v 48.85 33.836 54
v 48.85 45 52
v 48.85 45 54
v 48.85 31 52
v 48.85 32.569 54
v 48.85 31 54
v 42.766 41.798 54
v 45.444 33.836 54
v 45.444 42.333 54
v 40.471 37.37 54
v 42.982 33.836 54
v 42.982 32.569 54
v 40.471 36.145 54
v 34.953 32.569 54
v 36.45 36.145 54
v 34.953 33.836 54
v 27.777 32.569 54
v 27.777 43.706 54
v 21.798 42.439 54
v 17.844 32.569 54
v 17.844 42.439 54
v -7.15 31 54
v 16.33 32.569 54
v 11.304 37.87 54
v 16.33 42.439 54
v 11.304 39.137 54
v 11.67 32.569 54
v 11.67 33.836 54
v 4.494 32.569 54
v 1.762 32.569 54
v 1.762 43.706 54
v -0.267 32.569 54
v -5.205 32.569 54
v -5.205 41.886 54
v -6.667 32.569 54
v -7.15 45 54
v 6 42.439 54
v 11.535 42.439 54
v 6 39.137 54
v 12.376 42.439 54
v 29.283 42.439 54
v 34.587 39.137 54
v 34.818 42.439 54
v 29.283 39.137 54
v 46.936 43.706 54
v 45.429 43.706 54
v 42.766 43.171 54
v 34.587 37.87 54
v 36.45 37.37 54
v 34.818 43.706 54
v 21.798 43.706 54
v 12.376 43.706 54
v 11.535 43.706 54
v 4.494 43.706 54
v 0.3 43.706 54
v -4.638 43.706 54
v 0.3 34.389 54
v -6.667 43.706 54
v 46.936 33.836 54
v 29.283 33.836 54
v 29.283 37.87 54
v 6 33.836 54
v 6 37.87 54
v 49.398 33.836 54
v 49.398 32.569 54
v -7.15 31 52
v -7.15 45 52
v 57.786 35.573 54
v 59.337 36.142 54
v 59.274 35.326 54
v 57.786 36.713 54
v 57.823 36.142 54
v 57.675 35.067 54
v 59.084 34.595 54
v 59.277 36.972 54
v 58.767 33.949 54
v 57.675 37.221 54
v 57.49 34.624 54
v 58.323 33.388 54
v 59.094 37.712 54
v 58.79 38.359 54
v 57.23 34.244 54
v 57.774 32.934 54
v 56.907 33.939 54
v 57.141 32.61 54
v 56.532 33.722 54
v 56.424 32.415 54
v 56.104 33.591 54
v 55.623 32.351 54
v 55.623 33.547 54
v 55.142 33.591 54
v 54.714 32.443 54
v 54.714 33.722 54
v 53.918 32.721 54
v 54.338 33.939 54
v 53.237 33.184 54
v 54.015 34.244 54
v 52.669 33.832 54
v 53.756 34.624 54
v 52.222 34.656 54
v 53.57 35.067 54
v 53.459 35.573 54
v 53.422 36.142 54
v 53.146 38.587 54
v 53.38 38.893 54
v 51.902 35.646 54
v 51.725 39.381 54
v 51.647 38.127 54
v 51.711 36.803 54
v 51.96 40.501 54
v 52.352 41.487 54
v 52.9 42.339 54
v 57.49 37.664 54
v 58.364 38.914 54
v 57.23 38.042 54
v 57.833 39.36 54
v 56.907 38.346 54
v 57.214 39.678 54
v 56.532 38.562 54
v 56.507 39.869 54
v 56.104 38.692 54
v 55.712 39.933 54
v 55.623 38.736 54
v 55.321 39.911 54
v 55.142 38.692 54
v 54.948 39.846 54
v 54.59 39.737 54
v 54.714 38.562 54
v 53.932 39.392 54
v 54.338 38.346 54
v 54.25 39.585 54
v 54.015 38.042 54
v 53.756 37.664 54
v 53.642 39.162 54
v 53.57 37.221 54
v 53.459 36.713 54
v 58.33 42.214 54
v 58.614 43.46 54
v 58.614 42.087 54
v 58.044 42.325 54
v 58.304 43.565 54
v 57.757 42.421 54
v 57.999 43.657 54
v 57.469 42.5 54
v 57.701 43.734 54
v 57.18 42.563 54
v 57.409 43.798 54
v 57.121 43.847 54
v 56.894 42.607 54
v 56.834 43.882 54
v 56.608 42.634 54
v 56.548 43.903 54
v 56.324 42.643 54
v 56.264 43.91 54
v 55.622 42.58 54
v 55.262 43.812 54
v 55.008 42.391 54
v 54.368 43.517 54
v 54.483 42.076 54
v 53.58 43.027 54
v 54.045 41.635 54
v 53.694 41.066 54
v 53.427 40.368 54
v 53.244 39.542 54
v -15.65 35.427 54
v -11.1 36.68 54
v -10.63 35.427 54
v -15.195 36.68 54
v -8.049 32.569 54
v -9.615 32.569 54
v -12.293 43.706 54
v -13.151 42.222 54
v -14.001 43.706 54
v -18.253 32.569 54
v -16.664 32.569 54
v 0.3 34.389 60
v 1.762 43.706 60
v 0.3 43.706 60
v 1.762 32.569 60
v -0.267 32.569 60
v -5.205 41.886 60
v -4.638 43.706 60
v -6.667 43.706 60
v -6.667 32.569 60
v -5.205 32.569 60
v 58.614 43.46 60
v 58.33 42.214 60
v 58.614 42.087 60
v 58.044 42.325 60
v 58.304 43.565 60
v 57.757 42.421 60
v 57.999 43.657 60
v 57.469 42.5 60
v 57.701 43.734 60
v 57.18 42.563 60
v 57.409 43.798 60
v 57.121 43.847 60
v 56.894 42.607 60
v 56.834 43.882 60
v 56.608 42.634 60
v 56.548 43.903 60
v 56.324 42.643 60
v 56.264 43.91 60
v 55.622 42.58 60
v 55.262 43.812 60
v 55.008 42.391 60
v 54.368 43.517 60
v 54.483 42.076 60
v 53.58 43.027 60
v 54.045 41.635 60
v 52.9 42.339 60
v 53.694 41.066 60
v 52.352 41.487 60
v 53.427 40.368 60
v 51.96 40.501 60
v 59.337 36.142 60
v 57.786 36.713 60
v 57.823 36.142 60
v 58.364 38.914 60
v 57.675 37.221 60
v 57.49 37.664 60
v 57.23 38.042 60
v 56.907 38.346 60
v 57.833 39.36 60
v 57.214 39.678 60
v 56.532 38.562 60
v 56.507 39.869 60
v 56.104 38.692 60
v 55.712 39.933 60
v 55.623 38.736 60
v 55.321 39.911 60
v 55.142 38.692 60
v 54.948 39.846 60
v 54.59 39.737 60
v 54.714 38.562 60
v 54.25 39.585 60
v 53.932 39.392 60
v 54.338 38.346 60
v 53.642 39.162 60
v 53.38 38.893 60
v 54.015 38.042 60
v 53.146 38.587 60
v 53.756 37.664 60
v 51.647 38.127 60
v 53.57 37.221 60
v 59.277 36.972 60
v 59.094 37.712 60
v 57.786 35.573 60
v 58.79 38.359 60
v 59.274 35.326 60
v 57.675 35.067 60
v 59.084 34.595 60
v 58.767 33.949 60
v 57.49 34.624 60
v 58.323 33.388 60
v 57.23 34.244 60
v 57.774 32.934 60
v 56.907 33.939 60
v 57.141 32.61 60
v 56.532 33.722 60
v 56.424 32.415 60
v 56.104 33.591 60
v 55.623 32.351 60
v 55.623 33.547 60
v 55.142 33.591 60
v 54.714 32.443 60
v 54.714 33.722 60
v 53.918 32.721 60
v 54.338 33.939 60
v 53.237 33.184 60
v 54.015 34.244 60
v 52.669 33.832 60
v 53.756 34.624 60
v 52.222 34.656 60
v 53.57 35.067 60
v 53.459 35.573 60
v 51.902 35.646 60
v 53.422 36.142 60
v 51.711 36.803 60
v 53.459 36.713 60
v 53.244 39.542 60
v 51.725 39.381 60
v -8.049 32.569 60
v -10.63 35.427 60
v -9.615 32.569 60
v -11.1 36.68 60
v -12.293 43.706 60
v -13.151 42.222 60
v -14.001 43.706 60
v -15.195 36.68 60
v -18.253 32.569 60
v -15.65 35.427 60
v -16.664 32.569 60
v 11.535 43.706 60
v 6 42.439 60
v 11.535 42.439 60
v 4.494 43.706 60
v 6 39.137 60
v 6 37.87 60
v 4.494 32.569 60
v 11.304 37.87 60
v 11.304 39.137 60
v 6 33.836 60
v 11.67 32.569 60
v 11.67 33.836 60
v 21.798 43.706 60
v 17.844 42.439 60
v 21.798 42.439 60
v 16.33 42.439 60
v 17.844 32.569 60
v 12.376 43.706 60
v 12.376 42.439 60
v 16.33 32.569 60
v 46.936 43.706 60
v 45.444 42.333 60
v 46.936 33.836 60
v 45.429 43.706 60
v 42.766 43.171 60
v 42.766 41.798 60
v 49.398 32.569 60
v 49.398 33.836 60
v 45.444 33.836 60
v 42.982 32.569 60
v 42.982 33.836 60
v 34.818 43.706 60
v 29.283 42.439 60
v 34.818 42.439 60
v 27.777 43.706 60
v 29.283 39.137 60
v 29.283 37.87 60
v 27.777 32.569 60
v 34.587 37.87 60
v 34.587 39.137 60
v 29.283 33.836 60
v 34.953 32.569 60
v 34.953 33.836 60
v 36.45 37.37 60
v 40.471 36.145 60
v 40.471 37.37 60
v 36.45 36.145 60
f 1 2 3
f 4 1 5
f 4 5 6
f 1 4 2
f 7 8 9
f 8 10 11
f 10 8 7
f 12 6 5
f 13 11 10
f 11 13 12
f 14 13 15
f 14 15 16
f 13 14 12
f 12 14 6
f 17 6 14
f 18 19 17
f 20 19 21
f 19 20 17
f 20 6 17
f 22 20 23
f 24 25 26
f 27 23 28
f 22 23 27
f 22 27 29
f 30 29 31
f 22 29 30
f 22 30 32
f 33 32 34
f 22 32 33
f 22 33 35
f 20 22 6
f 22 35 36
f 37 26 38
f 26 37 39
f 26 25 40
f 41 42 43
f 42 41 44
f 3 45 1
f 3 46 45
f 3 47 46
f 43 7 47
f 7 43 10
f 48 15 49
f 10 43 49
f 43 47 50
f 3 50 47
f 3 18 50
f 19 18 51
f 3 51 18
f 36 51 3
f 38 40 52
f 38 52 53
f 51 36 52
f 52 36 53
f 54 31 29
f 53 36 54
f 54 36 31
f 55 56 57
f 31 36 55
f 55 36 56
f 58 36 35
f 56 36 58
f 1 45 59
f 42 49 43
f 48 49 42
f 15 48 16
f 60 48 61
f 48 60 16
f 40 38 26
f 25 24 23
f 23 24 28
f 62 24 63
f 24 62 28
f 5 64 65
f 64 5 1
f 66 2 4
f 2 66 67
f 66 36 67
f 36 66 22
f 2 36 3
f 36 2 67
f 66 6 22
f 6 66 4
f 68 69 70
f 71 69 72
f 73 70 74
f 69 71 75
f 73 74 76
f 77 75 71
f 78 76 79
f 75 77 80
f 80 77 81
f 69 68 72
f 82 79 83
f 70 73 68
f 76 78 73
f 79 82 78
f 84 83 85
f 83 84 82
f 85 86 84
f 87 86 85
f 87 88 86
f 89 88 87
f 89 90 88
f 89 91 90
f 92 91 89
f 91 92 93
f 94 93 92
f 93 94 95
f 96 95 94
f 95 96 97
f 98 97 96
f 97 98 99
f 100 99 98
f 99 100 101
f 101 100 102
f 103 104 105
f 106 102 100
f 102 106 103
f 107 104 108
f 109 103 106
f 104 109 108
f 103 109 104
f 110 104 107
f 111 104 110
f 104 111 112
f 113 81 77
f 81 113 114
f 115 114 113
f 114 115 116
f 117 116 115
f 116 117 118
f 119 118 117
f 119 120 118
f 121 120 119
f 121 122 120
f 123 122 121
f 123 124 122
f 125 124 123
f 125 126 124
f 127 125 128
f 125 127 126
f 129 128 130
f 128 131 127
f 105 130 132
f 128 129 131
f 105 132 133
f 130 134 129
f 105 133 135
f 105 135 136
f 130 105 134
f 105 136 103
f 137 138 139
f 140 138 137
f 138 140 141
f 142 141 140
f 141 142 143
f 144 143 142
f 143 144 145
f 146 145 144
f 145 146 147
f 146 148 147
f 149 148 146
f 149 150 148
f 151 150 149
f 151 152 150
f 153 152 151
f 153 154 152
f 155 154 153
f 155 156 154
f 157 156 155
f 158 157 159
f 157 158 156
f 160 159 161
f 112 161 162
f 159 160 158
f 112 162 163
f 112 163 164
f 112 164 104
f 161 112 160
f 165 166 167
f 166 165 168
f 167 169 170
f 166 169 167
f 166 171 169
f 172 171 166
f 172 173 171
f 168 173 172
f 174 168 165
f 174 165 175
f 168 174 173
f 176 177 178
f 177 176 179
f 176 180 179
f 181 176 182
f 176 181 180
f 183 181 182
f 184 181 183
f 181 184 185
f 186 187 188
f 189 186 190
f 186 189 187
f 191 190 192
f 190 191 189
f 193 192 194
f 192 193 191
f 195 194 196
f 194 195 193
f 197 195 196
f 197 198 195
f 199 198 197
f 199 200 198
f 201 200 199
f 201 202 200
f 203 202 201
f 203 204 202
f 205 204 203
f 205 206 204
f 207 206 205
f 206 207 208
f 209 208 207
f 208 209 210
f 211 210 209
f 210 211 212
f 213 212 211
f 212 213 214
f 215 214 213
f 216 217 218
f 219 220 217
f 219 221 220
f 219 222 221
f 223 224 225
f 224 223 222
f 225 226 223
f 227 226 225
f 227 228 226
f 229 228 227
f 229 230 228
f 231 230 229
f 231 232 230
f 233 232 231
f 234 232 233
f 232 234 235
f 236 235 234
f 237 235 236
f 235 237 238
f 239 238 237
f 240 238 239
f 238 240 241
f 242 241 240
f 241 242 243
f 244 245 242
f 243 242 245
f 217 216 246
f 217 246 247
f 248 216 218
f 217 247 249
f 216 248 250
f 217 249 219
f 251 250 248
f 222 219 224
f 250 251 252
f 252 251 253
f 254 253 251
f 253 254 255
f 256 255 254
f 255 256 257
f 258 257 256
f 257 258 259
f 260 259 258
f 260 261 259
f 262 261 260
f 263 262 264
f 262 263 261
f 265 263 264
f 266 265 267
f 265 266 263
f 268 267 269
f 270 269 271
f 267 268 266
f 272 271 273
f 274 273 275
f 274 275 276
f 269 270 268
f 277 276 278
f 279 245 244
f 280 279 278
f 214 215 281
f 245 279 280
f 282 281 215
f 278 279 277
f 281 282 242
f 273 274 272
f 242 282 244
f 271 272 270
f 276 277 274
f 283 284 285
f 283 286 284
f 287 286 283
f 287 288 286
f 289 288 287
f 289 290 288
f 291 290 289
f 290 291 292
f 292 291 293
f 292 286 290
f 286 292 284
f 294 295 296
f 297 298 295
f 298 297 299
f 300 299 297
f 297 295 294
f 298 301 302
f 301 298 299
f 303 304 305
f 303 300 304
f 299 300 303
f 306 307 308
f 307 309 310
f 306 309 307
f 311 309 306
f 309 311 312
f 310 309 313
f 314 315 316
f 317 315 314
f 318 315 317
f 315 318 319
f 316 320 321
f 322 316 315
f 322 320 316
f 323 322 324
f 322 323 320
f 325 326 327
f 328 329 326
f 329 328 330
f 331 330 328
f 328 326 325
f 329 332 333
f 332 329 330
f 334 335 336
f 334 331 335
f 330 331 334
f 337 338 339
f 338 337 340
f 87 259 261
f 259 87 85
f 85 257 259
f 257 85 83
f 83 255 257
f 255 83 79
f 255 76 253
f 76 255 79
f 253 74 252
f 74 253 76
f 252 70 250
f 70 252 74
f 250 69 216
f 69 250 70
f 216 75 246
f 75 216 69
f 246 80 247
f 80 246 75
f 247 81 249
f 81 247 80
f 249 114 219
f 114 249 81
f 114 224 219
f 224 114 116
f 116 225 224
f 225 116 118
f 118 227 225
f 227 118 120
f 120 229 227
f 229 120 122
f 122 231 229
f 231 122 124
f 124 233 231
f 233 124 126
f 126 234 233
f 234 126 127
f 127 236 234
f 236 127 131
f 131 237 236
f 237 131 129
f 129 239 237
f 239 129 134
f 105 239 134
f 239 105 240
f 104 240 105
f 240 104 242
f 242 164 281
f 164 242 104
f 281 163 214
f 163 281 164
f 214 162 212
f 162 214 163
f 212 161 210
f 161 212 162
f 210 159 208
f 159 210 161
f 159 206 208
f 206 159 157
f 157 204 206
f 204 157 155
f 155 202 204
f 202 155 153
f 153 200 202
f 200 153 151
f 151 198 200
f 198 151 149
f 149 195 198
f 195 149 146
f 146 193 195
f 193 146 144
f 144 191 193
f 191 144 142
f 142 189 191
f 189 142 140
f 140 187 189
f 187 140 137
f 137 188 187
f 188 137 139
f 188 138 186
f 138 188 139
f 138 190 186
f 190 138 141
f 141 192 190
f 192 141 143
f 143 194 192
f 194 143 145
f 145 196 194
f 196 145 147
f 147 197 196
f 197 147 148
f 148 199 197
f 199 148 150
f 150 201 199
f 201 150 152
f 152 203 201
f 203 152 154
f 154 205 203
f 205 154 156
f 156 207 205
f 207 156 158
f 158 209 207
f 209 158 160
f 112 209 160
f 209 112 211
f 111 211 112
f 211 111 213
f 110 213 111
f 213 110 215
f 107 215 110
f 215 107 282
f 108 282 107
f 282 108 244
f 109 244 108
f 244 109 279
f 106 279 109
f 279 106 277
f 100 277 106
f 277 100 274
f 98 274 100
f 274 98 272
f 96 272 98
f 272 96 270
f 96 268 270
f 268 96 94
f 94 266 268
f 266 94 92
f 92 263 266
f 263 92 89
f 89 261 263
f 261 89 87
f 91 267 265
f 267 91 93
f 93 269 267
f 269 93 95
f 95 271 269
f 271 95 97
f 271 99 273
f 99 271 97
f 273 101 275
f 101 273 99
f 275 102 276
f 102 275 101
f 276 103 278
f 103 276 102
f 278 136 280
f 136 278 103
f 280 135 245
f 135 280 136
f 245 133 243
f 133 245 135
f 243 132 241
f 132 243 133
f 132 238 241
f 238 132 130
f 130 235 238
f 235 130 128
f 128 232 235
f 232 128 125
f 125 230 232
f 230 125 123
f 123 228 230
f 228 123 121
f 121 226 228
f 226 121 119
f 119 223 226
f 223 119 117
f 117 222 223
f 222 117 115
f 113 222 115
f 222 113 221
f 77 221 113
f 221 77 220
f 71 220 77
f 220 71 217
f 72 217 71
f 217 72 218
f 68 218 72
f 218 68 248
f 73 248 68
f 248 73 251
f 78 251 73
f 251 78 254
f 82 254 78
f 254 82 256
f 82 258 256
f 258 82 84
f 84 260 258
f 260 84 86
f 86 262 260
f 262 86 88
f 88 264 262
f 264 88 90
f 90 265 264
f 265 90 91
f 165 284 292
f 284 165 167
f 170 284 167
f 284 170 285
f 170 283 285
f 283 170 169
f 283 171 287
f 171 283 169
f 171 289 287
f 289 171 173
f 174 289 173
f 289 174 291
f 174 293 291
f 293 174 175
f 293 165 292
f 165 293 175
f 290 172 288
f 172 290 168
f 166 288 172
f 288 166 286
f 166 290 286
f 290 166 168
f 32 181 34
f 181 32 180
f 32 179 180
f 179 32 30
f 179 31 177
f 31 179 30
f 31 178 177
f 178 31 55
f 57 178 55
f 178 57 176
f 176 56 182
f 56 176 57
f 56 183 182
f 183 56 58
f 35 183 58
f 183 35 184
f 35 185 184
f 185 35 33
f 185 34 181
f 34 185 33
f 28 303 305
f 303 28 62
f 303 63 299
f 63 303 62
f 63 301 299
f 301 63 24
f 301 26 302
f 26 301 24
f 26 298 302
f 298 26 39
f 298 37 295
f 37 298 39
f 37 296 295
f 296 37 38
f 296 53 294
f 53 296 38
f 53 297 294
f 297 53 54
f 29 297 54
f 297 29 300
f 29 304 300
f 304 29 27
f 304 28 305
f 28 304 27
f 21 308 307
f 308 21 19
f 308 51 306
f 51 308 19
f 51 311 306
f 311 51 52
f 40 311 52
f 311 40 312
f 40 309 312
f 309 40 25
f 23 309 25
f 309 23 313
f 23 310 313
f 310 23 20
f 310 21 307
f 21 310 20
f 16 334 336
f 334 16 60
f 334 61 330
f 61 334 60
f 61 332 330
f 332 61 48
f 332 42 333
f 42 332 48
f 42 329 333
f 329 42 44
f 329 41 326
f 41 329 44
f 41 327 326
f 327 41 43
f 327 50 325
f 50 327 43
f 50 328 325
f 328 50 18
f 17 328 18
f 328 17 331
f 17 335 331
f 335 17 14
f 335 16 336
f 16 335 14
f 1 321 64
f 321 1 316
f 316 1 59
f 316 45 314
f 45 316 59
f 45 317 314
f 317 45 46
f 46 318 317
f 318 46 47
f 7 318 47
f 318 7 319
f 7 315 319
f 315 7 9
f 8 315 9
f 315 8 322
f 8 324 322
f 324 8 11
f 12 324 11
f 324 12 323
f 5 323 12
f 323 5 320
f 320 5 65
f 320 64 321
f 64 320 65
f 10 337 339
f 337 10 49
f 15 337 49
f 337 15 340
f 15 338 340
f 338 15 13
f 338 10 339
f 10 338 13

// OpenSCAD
//translate([21.66, 1.4, 0.0]) import("C:/Users/fatih/Desktop/anet_e16_fan_duct.stl");

////////////////////////////////////////////////////////////////////////////////////////////////////////////////////////////
// UTILITY MODULES /////////////////////////////////////////////////////////////////////////////////////////////////////////
////////////////////////////////////////////////////////////////////////////////////////////////////////////////////////////

module curved_corner_2D(a, h, cx=1.0, cy=0.0, fn=32, type=0) 
{
    if (type == 0)
    {
        difference()
        {
            cube([a, a, h]);
            translate([cx * a, cy * a, -1.0]) cylinder(h + 2.0, a, a, $fn=fn);
        }
    } else {
        difference()
        {
            cube([a, a, h]);
            difference()
            {
                translate([-0.1, -0.1, -0.1]) cube([a+0.2, a+0.2, h+0.2]);
                translate([cx * a, cy * a, -0.1]) cylinder(h + 0.2, a, a, $fn=fn);
            }
        }
    }
}


////////////////////////////////////////////////////////////////////////////////////////////////////////////////////////////
// Mount Part //////////////////////////////////////////////////////////////////////////////////////////////////////////////
////////////////////////////////////////////////////////////////////////////////////////////////////////////////////////////

module mountPart()
{
    // mount part base 
    difference() // lower left
    {
            difference()
            {
                translate([-20.0, -6.0, 0.0]) cube([38.0, 12.0, 8.0]);
                // corner cutter
                translate([15.0, -6.0, 0.0]) curved_corner_2D(a=3.0, h=8.0, cx=0.0, cy=1.0, fn=64);
            }
        // leftmost screw hole
        union()
        {
            translate([0.0, 0.0, -1.0]) cylinder(20.0, 1.6, 1.6, $fn=32); 
            translate([0.0, 0.0, 5.0]) cylinder(4.0, 3.0, 3.0, $fn=32); 
        }
    }

    difference() // upper part
    {
        union()
        {
            union()
            {
                translate([12.0, 26.0, 0.0]) cylinder(8.0, 6.0, 6.0, $fn=64);
                translate([6.0, 6.0, 0.0]) cube([12.0, 20.0, 8.0]);
            }
            translate([2.0, 6.0, 0.0]) curved_corner_2D(a=4.0, h=8.0, cx=0.0, cy=1.0, fn=64);
        }
        // upper screw hole
        union()
        {
            translate([12.0, 26.0, -1.0]) cylinder(20.0, 1.6, 1.6, $fn=32);
            translate([12.0, 26.0, 5.0]) cylinder(4.0, 3.0, 3.0, $fn=32);
        }
    }

    // rightmost part (hotend mount part)
    difference()
    {
        difference()
        {
            difference()
            {
                translate([18.0, 1.0, 0.0]) cube([43.7, 12.0, 8.0]);
                // hotend screw hole left
                translate([21.1, 7.0, -1.0]) cylinder(20.0, 1.6, 1.6, $fn=32);
            }
            // hotend screw hole right
            translate([35.6, 7.0, -1.0]) cylinder(20.0, 1.6, 1.6, $fn=32);
        } 
        // screw clearence 
        translate([38.5, 13.2, -1.0]) cylinder(20.0, 4.0, 4.0, $fn=128);
    }

    // center column curves left
    translate([18.0, 13.0, 0.0]) curved_corner_2D(a=3.0, h=8.0, cx=1.0, cy=1.0, fn=64);
    translate([18.0, -2.0, 0.0]) curved_corner_2D(a=3.0, h=8.0, cx=1.0, cy=0.0, fn=64);
    

    // upper part 
    // left mount plate
    difference()
    {
        difference()
        {
            translate([-25.0, -6.0, 0.0]) cube([5.0, 25.0, 12.0]);
            // upper screw hole
            translate([-26.0, 11.0, 6.0]) rotate([0.0, 90.0, 0.0]) cylinder(20.0, 1.6, 1.6, $fn=32);
        }
        // lower screw hole
        translate([-26.0, 3.0, 6.0]) rotate([0.0, 90.0, 0.0]) cylinder(20.0, 1.6, 1.6, $fn=32);
    }
    translate([-30.0, -6.0, 0.0]) cube([5.0, 25.0, 2.0]);
    translate([-20.0, 6.0, 0.0]) curved_corner_2D(a=3.0, h=8.0, cx=1.0, cy=1.0, fn=64);
    //translate([11.05, -4.0, 0.0]) curved_corner_2D(a=3.5, h=20.0, cx=1.0, cy=1.0, fn=64);

    // right mount plate
    difference()
    {
        difference()
        {
            translate([61.7, -6.0, 0.0]) cube([5.0, 25.0, 12.0]);
            translate([60.0, 3.0, 6.0]) rotate([0.0, 90.0, 0.0]) cylinder(20.0, 1.6, 1.6, $fn=32);
        }
        translate([60.0, 11.0, 6.0]) rotate([0.0, 90.0, 0.0]) cylinder(20.0, 1.6, 1.6, $fn=32);
    }
    translate([66.0, -6.0, 0.0]) cube([5.0, 25.0, 2.0]);
    // center column curves right
    translate([57.7, 13.0, 0.0]) curved_corner_2D(a=4.0, h=8.0, cx=0.0, cy=1.0, fn=64);
    translate([57.7, -3.0, 0.0]) curved_corner_2D(a=4.0, h=8.0, cx=0.0, cy=0.0, fn=64);
}



/////////////////////////////////////////////////////////////////////////////////////////////////////////////////////////////
/// Fan Cover Part //////////////////////////////////////////////////////////////////////////////////////////////////////////
/////////////////////////////////////////////////////////////////////////////////////////////////////////////////////////////

module fanCoverPart()
{
    
    // fan cover front
    difference()
    {
        difference()
        {
            translate([-26.0, -20.0, 55.0]) cube([93.7, 70.0, 4.0]);
            translate([20.85, 38.0, 59.0]) linear_extrude(10, center=true, convexity=0, 1.0, slices=1, scale=1.0) text("ANET E-16", 11, "Impact", halign="center", valign="center");
        }
        translate([20.85, 8.0, 54.5]) cylinder(5.0, 16.0, 20.0, $fn=256);
    }
    union()
    {
        // center holders
        union()
        {
            translate([0.85, 8.0, 57.0]) cube([40.0, 2.0, 2.0]); 
            translate([19.85, -12.0, 57.0]) cube([2.0, 40.0, 2.0]);
        }
        // center sphere
        translate([20.85, 8.0, 55.0]) cylinder(4.0, 12.0, 14.0, $fn=256);
    }
        
    // front fan screw holes
    translate([20.85, 8.0, 56.0])
    {
        // fan screw mount hole upper left
        translate([-16.0, -16.0, -5.0]) difference()
        {
            cylinder(4.0, 4.0, 4.0, $fn=64);
            translate([0.0, 0.0, -1.0]) cylinder(5.0, 1.6, 1.6, $fn=32);
        }
        // fan screw mount hole lower left
        translate([-16.0, 16.0, -5.0]) difference()
        {
            cylinder(4.0, 4.0, 4.0, $fn=64);
            translate([0.0, 0.0, -1.0]) cylinder(5.0, 1.6, 1.6, $fn=32);
        }
        // fan screw mount hole upper right
        translate([16.0, -16.0, -5.0]) difference()
        {
            cylinder(4.0, 4.0, 4.0, $fn=64);
            translate([0.0, 0.0, -1.0]) cylinder(5.0, 1.6, 1.6, $fn=32);
        }
        // fan screw mount hole lower right
        translate([16.0, 16.0, -5.0]) difference()
        {
            cylinder(4.0, 4.0, 4.0, $fn=64);
            translate([0.0, 0.0, -1.0]) cylinder(5.0, 1.6, 1.6, $fn=32);
        }
    }
    
    // fan cover left side
    difference()
    {
        difference()
        {
            difference()
            {
                difference()
                {
                    difference()
                    {
                        difference()
                        {
                            translate([-30.0, -20.0, 0.0]) cube([5.0, 70.0, 55.0]);
                            for(y = [0:13])
                            {
                                for(x = [0:7])
                                {
                                    translate([-22.5, -4.0 + x * 4.0 + (y % 2) * 2.0, 24.0 + y * 2.0]) rotate([0.0, -90.0, 0.0]) cylinder(30.0, 1.2, 1.2, $fn=32);
                                }
                            }
                        }
                        translate([-31.0, -6.2, -1.0]) cube([7.0, 25.4, 3.2]);
                    }
                    // upper screw hole
                    translate([-31.0, 11.0, 6.0]) rotate([0.0, 90.0, 0.0]) cylinder(20.0, 1.6, 1.6, $fn=32);
                }
                translate([-31.0, 11.0, 6.0]) rotate([0.0, 90.0, 0.0]) cylinder(4.0, 3.0, 3.0, $fn=32);
            }
            // lower screw hole
            translate([-31.0, 3.0, 6.0]) rotate([0.0, 90.0, 0.0]) cylinder(20.0, 1.6, 1.6, $fn=32);
        }
        translate([-31.0, 3.0, 6.0]) rotate([0.0, 90.0, 0.0]) cylinder(4.0, 3.0, 3.0, $fn=32);
    }
    
    translate([-13.0, -20.0, 8.2]) cube([3.0, 60.0, 46.8]);
    
    // fan cover right side
    difference()
    {
        difference()
        {
            difference()
            {
                difference()
                {
                    difference()
                    {
                        translate([66.7, -20.0, 0.0]) cube([5.0, 70.0, 55.0]);
                        translate([65.7, -6.2, -1.0]) cube([7.0, 25.4, 3.2]);
                    }
                    // upper screw hole
                    translate([65.7, 11.0, 6.0]) rotate([0.0, 90.0, 0.0]) cylinder(20.0, 1.6, 1.6, $fn=32);
                }
                translate([68.7, 11.0, 6.0]) rotate([0.0, 90.0, 0.0]) cylinder(4.0, 3.0, 3.0, $fn=32);
            }
            // lower screw hole
            translate([65.7, 3.0, 6.0]) rotate([0.0, 90.0, 0.0]) cylinder(20.0, 1.6, 1.6, $fn=32);
        }
        translate([68.7, 3.0, 6.0]) rotate([0.0, 90.0, 0.0]) cylinder(4.0, 3.0, 3.0, $fn=32);
    }
    
    // fan cover top
    difference()
    {
        difference()
        {
            translate([-26.0, 50.0, 0.0]) cube([93.7, 4.0, 55.0]);
            translate([16.0, 49.0, 7.0]) cube([24.7, 6.0, 16.0]);
        }
        translate([-10.0, 49.0, 7.0]) cube([10.65, 6.0, 20.0]);        
    }
    
    translate([16.0, 50.0, 23.0]) rotate([-90.0, 0.0, 0.0]) curved_corner_2D(a=4.0, h=4.0, cx=1.0, cy=1.0, fn=128, type=0);
    translate([36.7, 50.0, 23.0]) rotate([-90.0, 0.0, 0.0]) curved_corner_2D(a=4.0, h=4.0, cx=0.0, cy=1.0, fn=128, type=0);
    translate([-10.0, 50.0, 27.0]) rotate([-90.0, 0.0, 0.0]) curved_corner_2D(a=4.0, h=4.0, cx=1.0, cy=1.0, fn=128, type=0);
    translate([-3.35, 50.0, 27.0]) rotate([-90.0, 0.0, 0.0]) curved_corner_2D(a=4.0, h=4.0, cx=0.0, cy=1.0, fn=128, type=0);
    
    // fan cover smooth edges
    translate([-26.0, 50.0, 59.0]) rotate([0.0, 90.0, 0.0]) curved_corner_2D(a=4.0, h=93.7, cx=1.0, cy=0.0, fn=128, type=1);
    translate([-30.0, -20.0, 59.0]) rotate([-90.0, 0.0, 0.0]) curved_corner_2D(a=4.0, h=70.0, cx=1.0, cy=1.0, fn=128, type=1);
    translate([67.7, -20.0, 59.0]) rotate([-90.0, 0.0, 0.0]) curved_corner_2D(a=4.0, h=70.0, cx=0.0, cy=1.0, fn=128, type=1);
    
    translate([-30.0, 50.0, 0.0]) rotate([0.0, 0.0, 0.0]) curved_corner_2D(a=4.0, h=55.0, cx=1.0, cy=0.0, fn=128, type=1);
    translate([67.7, 50.0, 0.0]) rotate([0.0, 0.0, 0.0]) curved_corner_2D(a=4.0, h=55.0, cx=0.0, cy=0.0, fn=128, type=1);
    
    // fan cover down
    translate([-25.0, -20.0, 35.0]) cube([91.7, 4.0, 20.0]);
    difference()
    {
        translate([-25.0, -20.0, 12.2]) cube([12.0, 30.0, 2.0]);
        translate([-17.5, 0.0, 8.0]) rotate([0.0, 0.0, 0.0]) cylinder(10.0, 1.6, 1.6, $fn=32);
    }
    
    // fan cover smooth corners
    intersection()
    {
        intersection()
        {
            translate([-30.0, 50.0, 59.0]) rotate([-90.0, 0.0, 0.0]) curved_corner_2D(a=4.0, h=4.0, cx=1.0, cy=1.0, fn=128, type=1);
            translate([-30.0, 50.0, 59.0]) rotate([0.0, 90.0, 0.0]) curved_corner_2D(a=4.0, h=4.0, cx=1.0, cy=0.0, fn=128, type=1);
        }
        translate([-30.0, 50.0, 55.0]) rotate([0.0, 0.0, 0.0]) curved_corner_2D(a=4.0, h=4.0, cx=1.0, cy=0.0, fn=128, type=1);
    }
    
    // fan cover smooth corners
    intersection()
    {
        intersection()
        {
            translate([67.7, 50.0, 59.0]) rotate([-90.0, 0.0, 0.0]) curved_corner_2D(a=4.0, h=4.0, cx=0.0, cy=1.0, fn=128, type=1);
            translate([67.7, 50.0, 59.0]) rotate([0.0, 90.0, 0.0]) curved_corner_2D(a=4.0, h=4.0, cx=1.0, cy=0.0, fn=128, type=1);
        }
        translate([67.7, 50.0, 55.0]) rotate([0.0, 0.0, 0.0]) curved_corner_2D(a=4.0, h=4.0, cx=0.0, cy=0.0, fn=128, type=1);
    }
    
    // fan duct
    difference()
    {
        difference()
        {
            translate([-15.0, -25.0, 12.2]) rotate([0.0, 0.0, 65.0]) rotate([90.0, 0.0, 0.0]) linear_extrude(32.0, center=true, scale=0.5) square([10.0, 30.0]);
            translate([-15.0, -25.0, 12.2]) rotate([0.0, 0.0, 65.0]) rotate([90.0, 0.0, 0.0]) linear_extrude(36.0, center=true, scale=0.48) translate([2.0, 2.0, 0.0]) square([6.0, 26.0]);
        }
        translate([-25.0, -15.0, 14.5]) cube([9.9, 40.0, 20.0]);
    }
}





////////////////////////////////////////////////////////////////////////////////////////////////////////////////////////////
////////////////////////////////////////////////////////////////////////////////////////////////////////////////////////////
////////////////////////////////////////////////////////////////////////////////////////////////////////////////////////////
////////////////////////////////////////////////////////////////////////////////////////////////////////////////////////////
////////////////////////////////////////////////////////////////////////////////////////////////////////////////////////////


translate([-7.15, 31.0, 52.0]) cube([56.0, 14.0, 2.0]);
translate([20.85, 38.0, 57.0]) linear_extrude(6, center=true, convexity=0, 1.0, slices=1, scale=1.0) text("ANET E-16", 11, "Impact", halign="center", valign="center");

//mountPart();
//fanCoverPart();






// Hotend Placeholders /////////////////////////////////////////////////////////////////////////////////////////////////////
//translate([18.0, -16.0, 8.0]) cube([20.0, 28.0, 12.3]); // hotend heatsink
//translate([18.0, -33.8, 8.0]) cube([20.0, 10.0, 20.0]); // hotend 
//translate([8.35, -23.0, 36.0]) cube([40.0, 40.0, 10.0]); // hotend fan

//translate([-25.0, -15.0, 14.5]) cube([9.9, 40.0, 40.0]); // side fan
